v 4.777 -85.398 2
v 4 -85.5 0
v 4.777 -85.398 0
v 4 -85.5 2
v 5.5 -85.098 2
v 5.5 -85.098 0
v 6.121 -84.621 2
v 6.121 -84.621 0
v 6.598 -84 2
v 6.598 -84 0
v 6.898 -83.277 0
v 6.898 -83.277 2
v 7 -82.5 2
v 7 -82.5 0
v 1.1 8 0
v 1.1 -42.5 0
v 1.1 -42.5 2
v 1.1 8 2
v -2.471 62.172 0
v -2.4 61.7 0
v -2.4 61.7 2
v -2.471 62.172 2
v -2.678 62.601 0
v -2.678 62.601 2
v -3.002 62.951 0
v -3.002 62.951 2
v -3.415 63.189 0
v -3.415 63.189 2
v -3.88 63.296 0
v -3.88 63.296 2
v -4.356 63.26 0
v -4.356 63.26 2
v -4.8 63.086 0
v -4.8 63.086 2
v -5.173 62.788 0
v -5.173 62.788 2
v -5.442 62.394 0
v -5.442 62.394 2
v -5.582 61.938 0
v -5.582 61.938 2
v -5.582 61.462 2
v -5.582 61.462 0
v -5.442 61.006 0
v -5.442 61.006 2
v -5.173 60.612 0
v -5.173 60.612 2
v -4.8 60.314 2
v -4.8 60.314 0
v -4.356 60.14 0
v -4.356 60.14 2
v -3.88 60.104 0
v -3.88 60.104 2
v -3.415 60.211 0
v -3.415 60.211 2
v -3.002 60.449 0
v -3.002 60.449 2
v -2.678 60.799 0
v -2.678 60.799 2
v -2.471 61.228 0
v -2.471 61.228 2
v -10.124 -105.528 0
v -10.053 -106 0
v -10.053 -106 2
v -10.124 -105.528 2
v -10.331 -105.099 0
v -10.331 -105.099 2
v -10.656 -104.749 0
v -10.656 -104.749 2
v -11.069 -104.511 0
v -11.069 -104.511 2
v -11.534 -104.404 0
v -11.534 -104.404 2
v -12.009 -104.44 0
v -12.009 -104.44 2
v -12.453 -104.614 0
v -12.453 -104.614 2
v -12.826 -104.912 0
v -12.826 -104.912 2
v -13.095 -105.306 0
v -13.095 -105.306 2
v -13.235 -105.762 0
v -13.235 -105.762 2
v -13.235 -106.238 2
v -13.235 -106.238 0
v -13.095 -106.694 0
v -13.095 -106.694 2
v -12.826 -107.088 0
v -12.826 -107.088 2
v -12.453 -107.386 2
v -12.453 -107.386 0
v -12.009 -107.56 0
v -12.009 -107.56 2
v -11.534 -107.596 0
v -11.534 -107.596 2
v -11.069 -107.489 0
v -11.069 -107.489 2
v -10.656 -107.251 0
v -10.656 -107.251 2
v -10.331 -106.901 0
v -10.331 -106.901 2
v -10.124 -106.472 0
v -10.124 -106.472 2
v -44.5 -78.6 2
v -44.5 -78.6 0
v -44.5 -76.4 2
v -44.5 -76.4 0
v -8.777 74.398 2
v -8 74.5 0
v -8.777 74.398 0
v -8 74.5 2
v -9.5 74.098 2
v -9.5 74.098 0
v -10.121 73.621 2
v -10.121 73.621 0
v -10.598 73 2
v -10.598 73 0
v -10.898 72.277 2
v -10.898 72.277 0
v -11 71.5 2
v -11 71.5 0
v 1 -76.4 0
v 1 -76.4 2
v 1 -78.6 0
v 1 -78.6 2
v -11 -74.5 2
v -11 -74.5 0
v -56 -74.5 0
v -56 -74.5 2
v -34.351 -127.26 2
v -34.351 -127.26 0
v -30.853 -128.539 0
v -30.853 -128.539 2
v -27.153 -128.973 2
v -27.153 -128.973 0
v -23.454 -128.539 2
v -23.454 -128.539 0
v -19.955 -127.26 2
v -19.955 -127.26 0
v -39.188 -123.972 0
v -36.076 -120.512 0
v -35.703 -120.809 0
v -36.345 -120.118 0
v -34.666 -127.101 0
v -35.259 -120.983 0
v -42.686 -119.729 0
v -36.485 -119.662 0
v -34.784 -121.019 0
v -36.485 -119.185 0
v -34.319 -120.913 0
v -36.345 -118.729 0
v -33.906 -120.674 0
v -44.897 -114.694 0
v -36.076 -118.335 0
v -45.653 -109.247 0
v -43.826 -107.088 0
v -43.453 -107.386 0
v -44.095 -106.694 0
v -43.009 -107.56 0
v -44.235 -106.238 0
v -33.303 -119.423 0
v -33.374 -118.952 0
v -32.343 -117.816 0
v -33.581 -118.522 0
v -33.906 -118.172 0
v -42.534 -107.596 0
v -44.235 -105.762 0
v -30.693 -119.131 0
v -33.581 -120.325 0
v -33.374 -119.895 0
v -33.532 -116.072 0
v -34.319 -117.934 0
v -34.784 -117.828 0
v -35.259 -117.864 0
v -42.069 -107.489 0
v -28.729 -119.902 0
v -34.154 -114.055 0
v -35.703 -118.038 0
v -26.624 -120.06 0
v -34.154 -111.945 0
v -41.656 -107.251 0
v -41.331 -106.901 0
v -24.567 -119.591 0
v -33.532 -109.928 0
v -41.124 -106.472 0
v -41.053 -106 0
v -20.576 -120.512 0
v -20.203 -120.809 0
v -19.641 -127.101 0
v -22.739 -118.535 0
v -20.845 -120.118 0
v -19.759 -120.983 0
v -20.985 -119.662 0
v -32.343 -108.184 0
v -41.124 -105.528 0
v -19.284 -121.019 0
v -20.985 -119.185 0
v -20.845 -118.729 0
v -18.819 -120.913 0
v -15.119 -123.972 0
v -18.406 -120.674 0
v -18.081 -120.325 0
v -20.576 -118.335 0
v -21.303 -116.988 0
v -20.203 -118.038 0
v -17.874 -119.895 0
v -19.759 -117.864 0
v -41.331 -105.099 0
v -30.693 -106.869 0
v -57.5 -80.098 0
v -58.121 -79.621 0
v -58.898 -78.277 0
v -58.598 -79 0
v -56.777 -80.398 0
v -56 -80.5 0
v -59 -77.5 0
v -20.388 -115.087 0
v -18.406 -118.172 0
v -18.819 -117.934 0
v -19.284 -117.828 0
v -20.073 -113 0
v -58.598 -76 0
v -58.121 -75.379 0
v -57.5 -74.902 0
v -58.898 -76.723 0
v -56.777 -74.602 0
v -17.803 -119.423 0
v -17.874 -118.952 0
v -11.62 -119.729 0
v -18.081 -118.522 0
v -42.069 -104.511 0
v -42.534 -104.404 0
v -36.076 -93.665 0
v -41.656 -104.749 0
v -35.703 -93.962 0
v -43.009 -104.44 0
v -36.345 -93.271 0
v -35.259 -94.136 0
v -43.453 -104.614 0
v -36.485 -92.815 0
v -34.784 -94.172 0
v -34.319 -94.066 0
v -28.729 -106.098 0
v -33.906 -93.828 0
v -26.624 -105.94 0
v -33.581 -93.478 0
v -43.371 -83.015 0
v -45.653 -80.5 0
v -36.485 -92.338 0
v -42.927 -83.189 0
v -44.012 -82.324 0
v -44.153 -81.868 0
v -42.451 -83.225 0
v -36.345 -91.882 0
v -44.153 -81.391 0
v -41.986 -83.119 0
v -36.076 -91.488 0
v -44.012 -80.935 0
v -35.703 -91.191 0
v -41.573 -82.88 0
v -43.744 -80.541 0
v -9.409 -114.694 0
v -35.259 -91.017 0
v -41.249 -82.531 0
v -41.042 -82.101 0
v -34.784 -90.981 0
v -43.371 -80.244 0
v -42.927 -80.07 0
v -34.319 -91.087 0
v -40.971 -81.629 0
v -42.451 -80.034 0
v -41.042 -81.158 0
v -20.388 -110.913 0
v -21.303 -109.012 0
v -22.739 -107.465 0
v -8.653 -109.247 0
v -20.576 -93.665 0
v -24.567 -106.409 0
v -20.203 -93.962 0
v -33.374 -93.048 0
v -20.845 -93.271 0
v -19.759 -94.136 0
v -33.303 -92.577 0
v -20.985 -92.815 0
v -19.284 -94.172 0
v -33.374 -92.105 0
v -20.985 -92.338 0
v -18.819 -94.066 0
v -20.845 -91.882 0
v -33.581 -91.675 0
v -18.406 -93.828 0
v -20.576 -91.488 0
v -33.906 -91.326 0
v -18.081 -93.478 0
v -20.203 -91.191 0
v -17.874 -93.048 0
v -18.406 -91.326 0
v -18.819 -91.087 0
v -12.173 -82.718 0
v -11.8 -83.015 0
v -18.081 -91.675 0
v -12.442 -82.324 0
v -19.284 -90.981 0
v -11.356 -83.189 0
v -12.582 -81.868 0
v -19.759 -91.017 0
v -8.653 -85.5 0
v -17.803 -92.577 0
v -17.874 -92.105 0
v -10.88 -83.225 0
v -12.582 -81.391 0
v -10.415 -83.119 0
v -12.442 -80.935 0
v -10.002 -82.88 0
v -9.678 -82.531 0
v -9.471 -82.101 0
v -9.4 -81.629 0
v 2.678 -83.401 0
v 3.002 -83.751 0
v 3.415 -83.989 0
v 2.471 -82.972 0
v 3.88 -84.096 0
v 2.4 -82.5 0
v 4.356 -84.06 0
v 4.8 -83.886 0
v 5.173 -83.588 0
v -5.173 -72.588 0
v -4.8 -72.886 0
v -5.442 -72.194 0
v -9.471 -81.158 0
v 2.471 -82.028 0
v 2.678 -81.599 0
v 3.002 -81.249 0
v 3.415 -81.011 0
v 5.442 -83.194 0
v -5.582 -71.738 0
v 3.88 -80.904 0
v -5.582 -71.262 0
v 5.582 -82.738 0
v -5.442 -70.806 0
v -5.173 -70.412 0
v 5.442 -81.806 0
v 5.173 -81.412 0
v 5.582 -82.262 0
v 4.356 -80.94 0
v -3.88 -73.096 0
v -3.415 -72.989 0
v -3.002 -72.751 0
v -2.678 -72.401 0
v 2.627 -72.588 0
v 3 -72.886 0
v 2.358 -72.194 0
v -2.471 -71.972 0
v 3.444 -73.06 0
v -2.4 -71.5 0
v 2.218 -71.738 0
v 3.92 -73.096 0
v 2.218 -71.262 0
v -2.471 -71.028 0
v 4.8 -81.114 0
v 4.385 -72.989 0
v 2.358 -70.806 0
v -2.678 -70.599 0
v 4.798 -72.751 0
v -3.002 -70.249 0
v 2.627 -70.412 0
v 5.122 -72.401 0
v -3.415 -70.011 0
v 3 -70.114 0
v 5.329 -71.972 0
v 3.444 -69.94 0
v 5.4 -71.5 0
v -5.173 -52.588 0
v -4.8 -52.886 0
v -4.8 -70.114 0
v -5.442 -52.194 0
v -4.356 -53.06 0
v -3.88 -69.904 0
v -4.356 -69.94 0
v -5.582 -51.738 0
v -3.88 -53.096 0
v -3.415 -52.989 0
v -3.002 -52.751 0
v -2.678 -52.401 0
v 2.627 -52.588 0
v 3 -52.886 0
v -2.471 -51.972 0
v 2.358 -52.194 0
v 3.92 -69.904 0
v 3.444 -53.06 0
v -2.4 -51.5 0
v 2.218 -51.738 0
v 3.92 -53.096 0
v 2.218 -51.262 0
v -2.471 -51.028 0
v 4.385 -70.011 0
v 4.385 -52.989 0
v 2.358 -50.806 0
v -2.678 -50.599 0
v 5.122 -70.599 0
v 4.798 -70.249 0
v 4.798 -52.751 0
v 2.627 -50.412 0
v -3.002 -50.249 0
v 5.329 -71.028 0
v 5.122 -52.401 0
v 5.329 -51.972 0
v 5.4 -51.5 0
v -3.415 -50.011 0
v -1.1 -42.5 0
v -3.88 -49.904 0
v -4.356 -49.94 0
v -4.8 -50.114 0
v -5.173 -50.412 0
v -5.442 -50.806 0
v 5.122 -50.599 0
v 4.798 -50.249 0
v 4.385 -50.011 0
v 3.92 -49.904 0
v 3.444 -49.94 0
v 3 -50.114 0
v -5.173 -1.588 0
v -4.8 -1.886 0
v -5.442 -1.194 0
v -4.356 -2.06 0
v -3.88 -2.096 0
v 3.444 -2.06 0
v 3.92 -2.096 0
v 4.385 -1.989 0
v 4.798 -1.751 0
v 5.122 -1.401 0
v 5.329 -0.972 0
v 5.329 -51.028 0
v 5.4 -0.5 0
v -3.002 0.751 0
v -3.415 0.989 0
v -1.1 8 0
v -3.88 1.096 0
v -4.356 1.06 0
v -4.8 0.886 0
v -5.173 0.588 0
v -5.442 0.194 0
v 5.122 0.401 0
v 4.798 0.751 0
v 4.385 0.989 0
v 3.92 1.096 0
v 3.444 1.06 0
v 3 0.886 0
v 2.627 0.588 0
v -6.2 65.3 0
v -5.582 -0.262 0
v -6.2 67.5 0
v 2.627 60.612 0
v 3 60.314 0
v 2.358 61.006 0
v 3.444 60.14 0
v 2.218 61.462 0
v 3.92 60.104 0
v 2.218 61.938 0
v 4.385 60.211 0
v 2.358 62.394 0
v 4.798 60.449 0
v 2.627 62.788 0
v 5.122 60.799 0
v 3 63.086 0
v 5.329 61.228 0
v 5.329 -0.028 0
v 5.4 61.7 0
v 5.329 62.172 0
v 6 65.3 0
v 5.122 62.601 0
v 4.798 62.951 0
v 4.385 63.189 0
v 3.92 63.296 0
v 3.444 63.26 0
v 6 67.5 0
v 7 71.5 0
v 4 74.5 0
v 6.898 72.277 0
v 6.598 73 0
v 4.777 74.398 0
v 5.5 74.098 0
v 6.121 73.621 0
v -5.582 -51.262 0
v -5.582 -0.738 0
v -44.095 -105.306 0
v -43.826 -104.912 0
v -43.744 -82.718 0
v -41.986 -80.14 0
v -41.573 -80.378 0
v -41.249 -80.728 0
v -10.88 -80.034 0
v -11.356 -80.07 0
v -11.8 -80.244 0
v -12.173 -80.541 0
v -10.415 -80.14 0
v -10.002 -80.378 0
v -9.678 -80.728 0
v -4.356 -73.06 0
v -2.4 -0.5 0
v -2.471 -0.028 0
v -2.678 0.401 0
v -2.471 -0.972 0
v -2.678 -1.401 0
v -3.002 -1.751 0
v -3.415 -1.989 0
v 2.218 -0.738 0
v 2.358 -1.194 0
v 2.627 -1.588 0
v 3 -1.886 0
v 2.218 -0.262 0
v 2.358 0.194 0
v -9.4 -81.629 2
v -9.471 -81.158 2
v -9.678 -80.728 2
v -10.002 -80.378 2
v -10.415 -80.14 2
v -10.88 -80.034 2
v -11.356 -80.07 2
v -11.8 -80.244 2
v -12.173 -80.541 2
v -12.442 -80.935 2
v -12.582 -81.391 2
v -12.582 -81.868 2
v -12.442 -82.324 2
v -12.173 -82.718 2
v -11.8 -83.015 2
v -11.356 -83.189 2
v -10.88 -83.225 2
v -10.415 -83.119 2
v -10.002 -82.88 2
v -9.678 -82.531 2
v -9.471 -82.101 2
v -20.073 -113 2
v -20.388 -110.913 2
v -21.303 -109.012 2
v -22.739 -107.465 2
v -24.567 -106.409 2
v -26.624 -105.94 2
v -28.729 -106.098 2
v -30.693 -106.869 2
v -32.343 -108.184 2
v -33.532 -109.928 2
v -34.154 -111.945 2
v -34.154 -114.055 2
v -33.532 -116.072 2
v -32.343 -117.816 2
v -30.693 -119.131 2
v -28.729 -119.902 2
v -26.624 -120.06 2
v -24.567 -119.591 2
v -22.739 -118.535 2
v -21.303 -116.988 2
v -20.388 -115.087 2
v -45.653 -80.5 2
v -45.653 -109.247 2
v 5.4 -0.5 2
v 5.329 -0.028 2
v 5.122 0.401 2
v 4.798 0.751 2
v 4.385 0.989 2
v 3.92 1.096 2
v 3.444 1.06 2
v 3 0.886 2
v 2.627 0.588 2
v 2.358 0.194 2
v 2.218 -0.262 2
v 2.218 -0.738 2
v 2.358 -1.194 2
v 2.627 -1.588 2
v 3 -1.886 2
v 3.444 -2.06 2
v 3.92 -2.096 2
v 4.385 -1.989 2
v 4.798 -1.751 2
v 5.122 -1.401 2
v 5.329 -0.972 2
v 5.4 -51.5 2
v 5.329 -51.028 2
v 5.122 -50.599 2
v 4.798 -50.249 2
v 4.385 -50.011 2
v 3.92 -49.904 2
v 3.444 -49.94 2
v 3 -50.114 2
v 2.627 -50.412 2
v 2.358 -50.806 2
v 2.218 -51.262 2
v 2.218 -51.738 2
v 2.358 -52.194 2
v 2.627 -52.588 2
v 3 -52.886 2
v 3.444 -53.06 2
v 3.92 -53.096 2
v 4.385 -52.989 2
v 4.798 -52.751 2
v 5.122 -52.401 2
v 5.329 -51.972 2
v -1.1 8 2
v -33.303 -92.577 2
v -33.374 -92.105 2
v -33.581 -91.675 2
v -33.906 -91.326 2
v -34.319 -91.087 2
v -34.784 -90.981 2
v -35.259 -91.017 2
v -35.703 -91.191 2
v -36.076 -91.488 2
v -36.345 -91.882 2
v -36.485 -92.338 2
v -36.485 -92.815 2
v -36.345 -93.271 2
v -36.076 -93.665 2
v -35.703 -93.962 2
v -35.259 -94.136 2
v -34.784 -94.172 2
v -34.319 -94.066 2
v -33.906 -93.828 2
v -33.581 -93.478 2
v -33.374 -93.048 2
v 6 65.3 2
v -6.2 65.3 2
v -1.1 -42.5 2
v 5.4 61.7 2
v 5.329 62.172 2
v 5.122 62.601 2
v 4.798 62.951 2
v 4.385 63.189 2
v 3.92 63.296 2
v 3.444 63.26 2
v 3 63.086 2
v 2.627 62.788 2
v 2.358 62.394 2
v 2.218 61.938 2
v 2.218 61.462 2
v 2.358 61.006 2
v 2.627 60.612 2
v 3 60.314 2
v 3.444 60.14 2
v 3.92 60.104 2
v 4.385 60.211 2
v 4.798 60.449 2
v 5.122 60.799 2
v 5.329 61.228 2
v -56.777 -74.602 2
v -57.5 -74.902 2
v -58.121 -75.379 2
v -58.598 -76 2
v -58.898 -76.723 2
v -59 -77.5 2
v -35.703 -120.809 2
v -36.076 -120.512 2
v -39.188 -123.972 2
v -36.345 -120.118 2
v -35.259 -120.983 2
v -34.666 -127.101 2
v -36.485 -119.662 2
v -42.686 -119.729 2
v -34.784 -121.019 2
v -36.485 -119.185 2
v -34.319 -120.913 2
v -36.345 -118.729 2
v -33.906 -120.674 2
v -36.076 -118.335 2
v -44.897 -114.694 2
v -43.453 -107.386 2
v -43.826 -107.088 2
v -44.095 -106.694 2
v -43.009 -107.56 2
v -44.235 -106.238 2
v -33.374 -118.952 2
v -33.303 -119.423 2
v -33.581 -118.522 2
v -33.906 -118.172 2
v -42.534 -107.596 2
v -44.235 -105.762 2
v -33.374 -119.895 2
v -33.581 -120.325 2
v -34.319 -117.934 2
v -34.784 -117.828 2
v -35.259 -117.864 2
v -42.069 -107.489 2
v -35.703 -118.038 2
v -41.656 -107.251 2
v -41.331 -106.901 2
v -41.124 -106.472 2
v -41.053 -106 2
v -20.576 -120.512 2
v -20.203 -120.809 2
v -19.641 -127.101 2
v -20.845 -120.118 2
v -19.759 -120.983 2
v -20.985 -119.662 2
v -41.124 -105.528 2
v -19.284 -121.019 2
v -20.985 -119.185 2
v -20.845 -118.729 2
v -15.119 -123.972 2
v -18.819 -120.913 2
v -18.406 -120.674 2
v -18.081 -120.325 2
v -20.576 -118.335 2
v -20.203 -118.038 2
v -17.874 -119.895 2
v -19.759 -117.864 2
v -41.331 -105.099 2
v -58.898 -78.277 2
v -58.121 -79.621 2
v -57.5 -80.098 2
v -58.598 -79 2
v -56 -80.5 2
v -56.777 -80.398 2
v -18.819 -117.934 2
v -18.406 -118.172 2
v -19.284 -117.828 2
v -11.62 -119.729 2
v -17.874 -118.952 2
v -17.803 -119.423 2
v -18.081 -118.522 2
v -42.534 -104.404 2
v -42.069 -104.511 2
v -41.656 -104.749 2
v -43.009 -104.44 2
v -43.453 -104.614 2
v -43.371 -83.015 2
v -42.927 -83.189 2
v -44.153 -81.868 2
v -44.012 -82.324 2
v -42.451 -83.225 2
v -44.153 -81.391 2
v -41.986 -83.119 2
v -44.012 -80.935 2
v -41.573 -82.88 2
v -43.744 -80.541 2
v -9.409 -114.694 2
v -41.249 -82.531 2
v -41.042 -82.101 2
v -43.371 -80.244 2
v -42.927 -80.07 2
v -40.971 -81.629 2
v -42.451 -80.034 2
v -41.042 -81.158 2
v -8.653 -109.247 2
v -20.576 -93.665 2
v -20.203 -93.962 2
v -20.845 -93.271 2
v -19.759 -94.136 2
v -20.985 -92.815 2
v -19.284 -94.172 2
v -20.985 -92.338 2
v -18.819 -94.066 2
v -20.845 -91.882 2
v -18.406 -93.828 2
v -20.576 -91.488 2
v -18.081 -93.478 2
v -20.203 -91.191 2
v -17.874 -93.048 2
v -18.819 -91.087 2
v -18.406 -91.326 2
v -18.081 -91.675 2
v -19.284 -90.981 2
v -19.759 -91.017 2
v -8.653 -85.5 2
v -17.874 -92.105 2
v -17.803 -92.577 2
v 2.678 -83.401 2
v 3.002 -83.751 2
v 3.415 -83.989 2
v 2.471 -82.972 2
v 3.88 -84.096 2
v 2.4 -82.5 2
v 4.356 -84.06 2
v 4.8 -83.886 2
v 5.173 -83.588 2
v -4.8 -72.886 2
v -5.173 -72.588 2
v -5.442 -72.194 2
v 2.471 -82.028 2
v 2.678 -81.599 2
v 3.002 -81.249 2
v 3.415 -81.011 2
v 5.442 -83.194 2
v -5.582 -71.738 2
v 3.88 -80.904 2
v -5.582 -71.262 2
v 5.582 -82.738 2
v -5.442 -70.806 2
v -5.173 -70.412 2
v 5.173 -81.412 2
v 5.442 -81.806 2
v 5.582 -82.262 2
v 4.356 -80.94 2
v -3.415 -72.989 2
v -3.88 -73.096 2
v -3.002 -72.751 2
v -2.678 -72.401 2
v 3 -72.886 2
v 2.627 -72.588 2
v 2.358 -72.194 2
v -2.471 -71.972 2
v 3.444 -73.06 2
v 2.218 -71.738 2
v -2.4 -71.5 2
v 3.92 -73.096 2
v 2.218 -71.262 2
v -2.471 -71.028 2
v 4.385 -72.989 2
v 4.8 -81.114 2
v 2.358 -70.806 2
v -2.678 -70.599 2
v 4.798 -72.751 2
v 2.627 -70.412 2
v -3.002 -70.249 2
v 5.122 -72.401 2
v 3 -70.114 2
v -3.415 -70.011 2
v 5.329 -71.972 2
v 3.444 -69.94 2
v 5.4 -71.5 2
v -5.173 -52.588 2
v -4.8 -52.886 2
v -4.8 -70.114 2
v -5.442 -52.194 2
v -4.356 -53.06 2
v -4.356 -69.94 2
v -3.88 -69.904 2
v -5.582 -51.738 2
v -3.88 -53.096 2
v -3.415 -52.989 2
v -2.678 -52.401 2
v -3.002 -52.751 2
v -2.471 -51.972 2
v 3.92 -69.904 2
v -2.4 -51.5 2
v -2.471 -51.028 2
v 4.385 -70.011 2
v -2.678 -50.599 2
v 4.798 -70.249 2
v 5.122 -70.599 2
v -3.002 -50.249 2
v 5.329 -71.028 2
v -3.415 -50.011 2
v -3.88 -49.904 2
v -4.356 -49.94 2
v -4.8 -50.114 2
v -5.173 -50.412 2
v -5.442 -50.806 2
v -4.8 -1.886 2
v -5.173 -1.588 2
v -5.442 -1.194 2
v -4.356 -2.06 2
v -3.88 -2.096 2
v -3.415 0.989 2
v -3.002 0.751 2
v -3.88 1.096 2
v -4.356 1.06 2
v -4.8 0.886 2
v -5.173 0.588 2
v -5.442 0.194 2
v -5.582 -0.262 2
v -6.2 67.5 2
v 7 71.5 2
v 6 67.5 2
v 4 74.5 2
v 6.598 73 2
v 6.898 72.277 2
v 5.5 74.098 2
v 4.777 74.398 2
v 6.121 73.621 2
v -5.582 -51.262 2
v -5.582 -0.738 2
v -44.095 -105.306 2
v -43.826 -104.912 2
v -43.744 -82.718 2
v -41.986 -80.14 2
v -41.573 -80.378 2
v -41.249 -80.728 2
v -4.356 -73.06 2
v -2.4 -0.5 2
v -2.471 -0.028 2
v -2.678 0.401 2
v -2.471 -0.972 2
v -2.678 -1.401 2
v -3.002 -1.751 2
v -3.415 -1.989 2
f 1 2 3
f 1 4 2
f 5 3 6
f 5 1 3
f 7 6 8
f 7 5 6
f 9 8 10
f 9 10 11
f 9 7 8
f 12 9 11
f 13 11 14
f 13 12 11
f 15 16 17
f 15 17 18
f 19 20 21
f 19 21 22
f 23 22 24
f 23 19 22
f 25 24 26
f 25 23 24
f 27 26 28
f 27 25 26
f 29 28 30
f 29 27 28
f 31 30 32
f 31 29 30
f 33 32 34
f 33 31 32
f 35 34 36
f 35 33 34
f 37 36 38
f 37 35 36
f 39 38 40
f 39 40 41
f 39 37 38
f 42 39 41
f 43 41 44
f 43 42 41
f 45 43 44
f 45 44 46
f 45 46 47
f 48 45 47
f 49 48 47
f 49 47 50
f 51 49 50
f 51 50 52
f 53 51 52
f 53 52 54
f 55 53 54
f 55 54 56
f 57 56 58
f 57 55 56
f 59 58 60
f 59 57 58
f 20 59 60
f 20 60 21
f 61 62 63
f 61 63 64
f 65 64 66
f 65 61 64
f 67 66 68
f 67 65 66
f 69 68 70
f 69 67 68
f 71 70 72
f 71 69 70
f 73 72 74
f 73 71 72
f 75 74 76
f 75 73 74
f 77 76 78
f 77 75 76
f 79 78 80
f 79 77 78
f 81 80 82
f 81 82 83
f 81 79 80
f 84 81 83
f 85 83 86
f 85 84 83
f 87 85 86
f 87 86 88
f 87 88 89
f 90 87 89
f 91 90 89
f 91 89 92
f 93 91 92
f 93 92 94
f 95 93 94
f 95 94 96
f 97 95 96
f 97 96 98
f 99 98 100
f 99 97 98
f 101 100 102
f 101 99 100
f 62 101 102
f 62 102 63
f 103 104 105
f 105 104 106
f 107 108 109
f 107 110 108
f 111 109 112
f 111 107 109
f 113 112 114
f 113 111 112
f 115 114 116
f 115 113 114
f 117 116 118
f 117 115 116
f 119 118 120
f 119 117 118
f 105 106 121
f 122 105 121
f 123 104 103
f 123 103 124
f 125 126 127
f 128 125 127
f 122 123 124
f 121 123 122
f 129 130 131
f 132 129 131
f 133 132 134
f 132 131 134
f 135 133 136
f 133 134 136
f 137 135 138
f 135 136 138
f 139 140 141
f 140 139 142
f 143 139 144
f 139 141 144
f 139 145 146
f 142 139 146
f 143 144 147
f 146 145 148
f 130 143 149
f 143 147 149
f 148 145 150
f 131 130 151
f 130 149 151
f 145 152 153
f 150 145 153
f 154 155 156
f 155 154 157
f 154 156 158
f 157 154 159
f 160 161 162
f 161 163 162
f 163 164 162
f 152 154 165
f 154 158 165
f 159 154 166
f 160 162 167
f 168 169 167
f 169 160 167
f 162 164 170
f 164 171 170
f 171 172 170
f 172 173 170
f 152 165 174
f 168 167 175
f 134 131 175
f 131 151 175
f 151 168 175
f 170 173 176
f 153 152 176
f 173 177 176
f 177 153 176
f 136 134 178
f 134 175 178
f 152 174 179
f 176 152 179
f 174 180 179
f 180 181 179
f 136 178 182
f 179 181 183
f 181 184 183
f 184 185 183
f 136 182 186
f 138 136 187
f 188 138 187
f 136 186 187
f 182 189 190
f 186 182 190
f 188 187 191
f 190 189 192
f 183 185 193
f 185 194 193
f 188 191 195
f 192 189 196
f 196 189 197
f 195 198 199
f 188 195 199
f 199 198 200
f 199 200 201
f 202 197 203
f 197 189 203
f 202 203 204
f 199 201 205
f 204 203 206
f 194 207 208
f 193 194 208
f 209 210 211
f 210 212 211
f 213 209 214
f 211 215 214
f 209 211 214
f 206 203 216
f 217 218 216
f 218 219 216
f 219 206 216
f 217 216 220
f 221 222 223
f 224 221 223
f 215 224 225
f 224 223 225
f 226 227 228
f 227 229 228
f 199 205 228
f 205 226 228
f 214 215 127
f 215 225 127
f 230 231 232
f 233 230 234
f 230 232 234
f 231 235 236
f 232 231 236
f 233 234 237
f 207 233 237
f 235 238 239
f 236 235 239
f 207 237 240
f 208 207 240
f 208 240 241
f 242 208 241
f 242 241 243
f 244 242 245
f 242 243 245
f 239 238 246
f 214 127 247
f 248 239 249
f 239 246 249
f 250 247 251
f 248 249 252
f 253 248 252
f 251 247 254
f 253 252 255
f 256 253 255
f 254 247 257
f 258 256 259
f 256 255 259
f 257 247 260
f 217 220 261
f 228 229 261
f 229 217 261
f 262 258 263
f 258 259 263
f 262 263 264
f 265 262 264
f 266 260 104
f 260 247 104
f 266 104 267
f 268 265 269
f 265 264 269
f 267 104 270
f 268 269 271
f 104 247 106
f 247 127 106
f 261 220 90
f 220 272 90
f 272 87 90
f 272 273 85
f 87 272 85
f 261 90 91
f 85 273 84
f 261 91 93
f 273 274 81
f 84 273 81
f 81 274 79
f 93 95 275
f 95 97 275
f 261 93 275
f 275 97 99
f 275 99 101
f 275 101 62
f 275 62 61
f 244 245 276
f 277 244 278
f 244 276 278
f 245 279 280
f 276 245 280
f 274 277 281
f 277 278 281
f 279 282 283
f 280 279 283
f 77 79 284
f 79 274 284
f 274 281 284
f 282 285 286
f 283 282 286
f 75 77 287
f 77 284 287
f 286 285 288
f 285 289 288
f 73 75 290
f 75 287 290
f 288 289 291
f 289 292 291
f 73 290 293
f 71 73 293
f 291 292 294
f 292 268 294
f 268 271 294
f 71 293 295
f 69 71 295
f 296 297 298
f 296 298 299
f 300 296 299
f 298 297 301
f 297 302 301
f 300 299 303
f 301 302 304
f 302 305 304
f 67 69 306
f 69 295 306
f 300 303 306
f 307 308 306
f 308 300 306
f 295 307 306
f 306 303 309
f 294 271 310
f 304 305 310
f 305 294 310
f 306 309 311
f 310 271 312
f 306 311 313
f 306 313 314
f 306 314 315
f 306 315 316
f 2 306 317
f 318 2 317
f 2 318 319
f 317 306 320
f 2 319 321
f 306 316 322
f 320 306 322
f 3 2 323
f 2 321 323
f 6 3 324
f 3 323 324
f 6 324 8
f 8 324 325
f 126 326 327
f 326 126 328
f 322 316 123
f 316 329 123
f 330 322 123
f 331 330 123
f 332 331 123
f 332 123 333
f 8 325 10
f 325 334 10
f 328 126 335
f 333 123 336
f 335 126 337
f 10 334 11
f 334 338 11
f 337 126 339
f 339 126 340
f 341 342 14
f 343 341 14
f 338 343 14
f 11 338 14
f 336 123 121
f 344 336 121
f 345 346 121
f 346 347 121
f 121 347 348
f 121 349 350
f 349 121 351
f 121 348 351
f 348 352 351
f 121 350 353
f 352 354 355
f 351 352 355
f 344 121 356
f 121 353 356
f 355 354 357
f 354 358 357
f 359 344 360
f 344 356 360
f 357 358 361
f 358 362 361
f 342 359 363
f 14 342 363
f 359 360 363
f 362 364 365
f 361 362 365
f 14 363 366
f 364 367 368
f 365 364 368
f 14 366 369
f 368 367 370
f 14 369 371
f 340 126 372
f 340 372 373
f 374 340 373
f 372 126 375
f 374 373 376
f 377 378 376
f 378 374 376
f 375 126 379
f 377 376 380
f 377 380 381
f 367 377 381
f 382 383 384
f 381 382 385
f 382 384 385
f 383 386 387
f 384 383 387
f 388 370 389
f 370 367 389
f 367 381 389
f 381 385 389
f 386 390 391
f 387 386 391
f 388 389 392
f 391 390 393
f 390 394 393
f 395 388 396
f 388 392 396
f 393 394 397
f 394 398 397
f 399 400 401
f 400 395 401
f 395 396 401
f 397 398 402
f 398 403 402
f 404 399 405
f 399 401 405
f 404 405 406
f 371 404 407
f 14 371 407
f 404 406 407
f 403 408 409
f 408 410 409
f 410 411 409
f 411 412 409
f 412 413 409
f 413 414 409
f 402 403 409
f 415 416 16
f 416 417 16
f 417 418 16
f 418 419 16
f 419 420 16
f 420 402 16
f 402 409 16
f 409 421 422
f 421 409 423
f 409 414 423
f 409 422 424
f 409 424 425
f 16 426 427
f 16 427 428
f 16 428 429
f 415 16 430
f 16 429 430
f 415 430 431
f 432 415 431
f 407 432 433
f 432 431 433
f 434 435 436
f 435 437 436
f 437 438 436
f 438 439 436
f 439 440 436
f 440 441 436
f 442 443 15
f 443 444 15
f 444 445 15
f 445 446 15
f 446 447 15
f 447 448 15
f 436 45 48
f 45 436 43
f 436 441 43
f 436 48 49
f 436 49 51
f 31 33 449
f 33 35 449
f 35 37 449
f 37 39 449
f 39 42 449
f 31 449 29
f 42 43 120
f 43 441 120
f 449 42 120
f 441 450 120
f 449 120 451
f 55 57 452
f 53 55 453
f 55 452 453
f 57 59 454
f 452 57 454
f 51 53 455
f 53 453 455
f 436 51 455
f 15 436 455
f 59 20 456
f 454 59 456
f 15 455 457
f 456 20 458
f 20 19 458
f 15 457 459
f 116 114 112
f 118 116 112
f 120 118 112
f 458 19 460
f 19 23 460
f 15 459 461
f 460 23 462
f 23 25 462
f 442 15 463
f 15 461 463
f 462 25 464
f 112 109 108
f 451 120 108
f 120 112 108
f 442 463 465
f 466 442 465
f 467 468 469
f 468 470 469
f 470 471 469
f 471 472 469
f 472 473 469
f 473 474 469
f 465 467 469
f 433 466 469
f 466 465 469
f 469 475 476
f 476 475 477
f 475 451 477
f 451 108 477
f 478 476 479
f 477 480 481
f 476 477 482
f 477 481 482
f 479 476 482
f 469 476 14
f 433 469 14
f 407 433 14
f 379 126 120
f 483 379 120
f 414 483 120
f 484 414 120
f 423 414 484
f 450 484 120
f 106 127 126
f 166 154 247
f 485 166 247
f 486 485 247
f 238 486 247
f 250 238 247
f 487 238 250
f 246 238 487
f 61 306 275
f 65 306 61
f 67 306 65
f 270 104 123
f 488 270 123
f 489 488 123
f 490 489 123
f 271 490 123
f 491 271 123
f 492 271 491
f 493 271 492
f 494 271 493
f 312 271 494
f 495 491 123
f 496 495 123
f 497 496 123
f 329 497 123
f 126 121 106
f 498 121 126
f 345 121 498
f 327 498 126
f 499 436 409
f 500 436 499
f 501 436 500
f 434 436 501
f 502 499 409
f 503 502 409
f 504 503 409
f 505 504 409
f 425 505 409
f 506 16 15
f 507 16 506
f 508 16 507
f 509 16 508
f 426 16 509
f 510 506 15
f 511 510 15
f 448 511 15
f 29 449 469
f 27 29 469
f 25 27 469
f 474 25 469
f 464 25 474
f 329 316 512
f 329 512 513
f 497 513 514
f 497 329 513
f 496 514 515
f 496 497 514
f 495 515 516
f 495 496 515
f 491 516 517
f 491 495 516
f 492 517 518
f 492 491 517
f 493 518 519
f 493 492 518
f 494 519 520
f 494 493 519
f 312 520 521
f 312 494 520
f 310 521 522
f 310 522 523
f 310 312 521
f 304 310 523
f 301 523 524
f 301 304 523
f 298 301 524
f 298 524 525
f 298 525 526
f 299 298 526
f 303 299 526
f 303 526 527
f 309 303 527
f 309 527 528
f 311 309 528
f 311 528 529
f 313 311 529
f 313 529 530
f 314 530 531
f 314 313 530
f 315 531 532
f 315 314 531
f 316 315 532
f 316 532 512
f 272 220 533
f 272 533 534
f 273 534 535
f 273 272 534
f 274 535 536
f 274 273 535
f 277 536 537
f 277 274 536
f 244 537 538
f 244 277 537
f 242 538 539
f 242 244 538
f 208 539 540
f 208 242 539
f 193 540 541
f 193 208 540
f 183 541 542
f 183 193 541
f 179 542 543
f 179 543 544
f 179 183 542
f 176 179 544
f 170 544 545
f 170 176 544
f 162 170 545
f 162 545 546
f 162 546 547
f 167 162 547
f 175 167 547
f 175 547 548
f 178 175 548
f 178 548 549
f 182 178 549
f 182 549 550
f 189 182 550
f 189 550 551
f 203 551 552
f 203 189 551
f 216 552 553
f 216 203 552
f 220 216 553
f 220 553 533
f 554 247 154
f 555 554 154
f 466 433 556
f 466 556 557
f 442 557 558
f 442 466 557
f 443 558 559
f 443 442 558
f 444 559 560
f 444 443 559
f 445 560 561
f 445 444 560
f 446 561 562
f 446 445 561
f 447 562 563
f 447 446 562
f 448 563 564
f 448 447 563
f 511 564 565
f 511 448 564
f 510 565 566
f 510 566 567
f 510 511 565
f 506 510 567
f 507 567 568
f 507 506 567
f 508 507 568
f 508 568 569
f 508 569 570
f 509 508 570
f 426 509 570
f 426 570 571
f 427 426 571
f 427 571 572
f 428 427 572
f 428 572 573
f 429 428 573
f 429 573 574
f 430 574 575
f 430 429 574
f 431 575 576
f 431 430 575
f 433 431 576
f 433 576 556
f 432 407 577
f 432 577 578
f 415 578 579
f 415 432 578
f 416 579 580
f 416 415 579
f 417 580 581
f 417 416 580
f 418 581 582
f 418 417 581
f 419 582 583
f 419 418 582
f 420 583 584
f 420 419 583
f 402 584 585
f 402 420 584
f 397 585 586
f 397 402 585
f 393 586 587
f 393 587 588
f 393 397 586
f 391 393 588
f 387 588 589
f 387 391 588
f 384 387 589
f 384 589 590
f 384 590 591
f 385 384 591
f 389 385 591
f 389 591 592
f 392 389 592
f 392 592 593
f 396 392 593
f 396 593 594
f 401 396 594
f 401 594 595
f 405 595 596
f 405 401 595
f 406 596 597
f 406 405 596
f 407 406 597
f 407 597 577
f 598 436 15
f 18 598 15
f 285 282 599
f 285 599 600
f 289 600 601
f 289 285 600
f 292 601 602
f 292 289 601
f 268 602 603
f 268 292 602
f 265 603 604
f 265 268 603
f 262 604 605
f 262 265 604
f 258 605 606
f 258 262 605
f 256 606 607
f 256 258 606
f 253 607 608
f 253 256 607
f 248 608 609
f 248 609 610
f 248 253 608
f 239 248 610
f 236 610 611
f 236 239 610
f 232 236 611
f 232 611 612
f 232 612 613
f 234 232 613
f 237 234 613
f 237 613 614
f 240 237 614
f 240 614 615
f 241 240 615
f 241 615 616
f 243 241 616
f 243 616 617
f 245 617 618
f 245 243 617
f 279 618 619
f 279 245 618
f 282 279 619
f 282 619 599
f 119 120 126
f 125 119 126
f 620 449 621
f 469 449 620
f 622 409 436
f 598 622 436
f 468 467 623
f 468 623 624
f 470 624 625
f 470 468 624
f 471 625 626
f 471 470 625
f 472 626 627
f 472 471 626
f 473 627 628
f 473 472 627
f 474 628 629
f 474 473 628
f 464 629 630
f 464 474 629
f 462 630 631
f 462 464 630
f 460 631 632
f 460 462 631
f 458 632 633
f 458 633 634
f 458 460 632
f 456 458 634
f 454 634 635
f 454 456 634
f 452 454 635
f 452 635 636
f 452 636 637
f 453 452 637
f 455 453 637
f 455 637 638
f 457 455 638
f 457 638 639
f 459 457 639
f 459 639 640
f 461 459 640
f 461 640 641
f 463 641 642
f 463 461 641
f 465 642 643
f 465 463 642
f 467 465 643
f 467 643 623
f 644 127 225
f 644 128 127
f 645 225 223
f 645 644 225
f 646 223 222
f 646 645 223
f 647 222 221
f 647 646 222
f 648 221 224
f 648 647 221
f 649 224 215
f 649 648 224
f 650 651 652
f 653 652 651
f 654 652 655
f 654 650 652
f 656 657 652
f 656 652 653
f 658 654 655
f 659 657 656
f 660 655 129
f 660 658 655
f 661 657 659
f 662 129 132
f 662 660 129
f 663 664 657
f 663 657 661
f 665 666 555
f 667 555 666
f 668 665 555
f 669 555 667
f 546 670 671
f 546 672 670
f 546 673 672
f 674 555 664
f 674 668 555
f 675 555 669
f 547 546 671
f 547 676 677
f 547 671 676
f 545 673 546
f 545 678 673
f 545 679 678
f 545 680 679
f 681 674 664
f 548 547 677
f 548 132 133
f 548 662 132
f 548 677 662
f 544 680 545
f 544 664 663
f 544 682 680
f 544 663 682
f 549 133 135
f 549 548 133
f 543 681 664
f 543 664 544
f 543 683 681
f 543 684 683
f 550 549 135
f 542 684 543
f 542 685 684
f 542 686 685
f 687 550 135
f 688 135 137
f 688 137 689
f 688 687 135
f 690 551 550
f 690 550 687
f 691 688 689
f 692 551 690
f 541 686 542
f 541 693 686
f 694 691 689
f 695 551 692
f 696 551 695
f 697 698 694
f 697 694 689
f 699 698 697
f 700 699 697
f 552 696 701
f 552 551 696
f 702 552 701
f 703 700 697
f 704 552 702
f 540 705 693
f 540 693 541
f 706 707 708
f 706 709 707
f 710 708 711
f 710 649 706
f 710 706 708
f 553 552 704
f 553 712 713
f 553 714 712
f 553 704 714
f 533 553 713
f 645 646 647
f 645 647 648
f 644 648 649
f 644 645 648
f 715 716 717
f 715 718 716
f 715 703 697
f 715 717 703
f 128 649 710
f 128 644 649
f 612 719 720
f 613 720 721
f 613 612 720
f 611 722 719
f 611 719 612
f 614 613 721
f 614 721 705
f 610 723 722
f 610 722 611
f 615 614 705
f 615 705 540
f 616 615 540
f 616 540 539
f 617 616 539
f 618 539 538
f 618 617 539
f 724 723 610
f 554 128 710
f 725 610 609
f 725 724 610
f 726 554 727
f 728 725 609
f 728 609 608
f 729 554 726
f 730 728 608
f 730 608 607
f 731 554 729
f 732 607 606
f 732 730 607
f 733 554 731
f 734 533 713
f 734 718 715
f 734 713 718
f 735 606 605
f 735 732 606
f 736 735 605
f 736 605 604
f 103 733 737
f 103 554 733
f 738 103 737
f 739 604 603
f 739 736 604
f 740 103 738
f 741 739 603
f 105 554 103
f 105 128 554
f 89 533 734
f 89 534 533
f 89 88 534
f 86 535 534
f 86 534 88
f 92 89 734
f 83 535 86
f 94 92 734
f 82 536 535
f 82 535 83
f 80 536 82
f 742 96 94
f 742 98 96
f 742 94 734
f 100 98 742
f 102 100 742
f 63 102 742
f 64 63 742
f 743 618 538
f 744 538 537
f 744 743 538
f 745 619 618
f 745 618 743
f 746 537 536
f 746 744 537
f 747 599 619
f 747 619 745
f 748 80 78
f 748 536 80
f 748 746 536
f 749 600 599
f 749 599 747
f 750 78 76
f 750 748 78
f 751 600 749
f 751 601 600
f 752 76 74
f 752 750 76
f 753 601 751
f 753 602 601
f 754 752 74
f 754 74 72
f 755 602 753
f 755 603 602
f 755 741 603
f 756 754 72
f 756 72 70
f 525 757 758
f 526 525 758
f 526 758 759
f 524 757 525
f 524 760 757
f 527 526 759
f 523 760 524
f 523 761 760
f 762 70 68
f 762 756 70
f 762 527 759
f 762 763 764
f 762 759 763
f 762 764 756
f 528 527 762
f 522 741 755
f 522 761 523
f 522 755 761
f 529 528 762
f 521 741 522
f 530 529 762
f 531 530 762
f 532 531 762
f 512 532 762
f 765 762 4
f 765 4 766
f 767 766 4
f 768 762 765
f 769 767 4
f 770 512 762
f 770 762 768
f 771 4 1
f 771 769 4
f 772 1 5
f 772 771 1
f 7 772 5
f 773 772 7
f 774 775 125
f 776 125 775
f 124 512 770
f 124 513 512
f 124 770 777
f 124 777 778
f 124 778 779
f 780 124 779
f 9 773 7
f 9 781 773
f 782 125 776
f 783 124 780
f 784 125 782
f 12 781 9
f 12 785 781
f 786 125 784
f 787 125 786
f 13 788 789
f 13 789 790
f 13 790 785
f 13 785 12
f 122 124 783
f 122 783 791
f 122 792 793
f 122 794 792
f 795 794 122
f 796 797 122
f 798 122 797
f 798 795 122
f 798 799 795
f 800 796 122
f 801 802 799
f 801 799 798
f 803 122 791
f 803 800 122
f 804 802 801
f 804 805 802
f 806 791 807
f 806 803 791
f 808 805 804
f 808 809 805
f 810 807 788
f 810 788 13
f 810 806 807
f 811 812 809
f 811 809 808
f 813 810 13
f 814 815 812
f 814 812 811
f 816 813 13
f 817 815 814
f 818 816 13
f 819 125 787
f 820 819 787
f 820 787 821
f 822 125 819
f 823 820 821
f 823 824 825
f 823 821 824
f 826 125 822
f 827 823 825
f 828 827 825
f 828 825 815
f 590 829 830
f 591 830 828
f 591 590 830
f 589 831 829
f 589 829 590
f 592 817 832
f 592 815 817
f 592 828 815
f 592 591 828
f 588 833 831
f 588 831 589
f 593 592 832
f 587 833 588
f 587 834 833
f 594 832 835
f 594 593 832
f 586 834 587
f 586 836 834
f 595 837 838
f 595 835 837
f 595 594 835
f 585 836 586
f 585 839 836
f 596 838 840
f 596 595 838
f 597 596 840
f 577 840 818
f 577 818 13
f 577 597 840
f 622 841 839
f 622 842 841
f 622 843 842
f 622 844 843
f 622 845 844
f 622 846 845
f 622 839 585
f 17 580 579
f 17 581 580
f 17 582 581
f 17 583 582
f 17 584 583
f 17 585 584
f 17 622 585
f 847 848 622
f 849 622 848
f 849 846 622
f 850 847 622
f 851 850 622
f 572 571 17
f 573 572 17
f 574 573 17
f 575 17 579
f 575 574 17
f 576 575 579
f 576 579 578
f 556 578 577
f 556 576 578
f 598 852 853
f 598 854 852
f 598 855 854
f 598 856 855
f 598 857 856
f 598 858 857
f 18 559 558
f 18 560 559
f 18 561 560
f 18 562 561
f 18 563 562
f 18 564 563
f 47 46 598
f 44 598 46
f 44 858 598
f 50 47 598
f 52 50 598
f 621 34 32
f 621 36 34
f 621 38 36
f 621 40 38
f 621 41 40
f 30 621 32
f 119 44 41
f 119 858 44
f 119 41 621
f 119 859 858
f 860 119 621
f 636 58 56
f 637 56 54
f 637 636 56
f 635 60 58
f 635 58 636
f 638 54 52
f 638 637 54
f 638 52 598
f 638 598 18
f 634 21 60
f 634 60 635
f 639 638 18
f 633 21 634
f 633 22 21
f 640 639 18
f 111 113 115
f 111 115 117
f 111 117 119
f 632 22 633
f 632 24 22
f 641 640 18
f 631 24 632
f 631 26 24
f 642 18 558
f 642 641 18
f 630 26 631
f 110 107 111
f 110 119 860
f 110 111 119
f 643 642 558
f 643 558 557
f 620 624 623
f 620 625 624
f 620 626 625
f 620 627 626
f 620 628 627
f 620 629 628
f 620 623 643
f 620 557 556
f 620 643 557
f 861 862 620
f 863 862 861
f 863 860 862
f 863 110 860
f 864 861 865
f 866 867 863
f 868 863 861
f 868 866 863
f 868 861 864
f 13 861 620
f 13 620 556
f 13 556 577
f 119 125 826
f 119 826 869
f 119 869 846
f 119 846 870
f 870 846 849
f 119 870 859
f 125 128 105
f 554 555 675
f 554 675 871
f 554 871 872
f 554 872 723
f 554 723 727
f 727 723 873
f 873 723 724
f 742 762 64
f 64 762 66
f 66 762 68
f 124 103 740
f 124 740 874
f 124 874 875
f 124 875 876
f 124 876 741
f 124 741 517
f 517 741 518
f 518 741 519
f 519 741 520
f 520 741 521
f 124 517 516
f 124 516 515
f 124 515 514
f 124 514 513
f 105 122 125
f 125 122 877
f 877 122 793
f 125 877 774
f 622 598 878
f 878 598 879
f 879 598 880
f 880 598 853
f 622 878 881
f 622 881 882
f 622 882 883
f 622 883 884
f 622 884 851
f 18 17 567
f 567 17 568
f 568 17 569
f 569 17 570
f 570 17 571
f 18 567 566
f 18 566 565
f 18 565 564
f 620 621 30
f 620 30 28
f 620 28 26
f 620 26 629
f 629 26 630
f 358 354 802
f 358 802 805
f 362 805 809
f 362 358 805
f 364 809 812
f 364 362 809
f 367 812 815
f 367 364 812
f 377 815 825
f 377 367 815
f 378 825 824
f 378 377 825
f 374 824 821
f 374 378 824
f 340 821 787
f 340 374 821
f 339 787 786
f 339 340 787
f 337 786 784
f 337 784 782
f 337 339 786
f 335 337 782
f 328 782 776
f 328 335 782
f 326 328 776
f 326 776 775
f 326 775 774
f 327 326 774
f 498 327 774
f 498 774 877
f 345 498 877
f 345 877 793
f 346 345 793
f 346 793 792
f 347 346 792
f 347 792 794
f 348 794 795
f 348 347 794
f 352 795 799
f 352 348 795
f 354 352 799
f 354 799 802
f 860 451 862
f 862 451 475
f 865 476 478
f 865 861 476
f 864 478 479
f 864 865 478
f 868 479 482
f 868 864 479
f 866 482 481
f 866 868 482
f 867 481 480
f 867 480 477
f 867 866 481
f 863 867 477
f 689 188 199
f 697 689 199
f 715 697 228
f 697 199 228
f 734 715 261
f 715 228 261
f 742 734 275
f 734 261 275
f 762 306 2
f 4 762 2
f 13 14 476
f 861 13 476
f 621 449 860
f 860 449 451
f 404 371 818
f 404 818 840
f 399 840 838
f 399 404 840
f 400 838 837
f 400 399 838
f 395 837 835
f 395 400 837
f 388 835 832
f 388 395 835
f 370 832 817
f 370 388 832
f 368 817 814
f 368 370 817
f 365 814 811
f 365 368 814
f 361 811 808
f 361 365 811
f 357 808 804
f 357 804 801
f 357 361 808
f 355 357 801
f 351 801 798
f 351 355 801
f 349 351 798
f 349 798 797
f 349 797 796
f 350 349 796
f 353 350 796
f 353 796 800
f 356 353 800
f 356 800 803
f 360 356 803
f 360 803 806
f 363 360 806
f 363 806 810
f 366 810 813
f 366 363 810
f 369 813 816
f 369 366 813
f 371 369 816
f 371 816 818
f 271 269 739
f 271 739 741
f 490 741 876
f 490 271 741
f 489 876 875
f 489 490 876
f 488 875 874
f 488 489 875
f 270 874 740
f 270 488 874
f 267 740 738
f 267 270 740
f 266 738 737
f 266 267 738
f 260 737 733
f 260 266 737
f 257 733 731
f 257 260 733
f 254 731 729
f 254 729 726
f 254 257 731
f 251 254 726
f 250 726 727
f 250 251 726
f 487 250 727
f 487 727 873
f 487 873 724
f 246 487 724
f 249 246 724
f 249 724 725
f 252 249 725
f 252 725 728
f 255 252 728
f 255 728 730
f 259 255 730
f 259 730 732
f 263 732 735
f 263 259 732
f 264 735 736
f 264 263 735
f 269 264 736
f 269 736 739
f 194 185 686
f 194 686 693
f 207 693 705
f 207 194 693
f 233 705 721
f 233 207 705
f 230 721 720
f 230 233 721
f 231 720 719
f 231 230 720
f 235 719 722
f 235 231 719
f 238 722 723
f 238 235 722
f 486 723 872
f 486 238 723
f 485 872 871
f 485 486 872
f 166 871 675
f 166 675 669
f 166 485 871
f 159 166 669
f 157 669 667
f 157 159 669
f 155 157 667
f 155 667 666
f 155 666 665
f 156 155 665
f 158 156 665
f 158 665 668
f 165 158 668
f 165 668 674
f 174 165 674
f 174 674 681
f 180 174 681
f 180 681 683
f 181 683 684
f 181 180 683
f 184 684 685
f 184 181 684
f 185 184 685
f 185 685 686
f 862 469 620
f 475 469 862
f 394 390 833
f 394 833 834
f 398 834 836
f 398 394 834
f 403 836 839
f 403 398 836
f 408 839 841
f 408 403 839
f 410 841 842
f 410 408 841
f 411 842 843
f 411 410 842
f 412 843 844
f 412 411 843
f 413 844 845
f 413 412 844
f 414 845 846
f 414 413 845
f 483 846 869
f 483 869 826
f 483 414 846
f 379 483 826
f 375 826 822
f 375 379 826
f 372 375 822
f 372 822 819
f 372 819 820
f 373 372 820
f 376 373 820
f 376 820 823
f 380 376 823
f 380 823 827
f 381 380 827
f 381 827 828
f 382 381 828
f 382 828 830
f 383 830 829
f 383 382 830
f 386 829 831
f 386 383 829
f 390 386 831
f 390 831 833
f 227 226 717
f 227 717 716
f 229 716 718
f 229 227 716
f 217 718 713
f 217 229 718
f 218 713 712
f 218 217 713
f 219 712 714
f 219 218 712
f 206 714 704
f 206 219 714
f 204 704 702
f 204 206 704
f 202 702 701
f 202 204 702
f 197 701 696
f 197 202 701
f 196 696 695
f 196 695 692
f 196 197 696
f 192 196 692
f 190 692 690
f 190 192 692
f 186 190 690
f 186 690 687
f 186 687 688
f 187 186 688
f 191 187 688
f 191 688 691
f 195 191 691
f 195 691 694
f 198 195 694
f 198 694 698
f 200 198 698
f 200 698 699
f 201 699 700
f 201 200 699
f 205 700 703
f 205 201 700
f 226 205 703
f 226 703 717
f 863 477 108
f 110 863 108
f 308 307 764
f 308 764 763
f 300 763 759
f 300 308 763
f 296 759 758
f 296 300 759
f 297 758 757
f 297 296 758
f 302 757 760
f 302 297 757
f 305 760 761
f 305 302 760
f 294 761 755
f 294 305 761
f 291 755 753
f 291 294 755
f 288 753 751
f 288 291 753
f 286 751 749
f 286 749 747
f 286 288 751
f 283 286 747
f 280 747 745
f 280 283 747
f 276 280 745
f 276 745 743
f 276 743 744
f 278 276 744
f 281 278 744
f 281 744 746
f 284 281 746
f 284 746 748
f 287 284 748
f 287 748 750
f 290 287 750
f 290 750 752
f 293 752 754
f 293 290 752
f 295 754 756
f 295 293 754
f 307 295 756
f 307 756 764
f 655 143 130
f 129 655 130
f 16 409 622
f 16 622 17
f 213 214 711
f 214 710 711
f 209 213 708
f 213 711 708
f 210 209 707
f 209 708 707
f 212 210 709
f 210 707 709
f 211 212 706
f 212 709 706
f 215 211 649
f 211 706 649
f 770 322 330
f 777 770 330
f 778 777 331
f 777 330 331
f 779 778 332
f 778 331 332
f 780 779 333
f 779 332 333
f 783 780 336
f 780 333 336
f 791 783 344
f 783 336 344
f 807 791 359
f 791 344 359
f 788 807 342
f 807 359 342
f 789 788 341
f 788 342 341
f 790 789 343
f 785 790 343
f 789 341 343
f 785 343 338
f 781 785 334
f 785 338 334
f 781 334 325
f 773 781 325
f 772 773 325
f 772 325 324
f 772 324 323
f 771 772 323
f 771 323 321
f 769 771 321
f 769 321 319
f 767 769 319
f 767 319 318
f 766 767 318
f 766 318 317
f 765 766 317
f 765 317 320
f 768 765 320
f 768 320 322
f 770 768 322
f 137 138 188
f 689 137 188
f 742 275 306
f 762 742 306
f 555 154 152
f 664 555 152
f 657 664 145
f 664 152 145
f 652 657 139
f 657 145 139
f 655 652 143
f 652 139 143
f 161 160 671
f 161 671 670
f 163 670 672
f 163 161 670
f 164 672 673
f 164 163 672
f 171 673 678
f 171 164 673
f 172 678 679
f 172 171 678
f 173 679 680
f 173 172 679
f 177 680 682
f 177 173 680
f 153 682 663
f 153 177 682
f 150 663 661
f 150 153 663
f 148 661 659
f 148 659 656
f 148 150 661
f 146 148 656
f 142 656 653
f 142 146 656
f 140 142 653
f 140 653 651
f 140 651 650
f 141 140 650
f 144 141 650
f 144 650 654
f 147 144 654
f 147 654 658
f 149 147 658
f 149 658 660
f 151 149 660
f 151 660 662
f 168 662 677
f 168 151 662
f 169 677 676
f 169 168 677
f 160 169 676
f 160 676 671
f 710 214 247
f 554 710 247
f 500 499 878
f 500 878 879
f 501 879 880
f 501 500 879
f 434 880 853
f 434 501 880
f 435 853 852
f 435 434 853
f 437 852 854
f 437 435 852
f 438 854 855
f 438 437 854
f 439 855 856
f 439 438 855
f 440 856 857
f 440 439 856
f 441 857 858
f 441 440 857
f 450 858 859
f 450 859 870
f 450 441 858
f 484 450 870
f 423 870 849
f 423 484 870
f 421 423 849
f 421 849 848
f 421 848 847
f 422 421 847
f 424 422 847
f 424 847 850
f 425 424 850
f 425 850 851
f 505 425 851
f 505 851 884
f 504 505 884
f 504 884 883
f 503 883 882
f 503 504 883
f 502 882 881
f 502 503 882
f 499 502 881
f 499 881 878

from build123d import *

# Parameters (mm, degrees)
SKETCH_1_R          = 1.6
SKETCH_1_W          = 45.5
SKETCH_1_H          = 2.2
SKETCH_1_W_2        = 2.2
SKETCH_1_H_2        = 50.5
SKETCH_1_W_3        = 12.2
SKETCH_1_R_2        = 7.08
EXTRUDE_1_DEPTH     = 2
SKETCH_2_W          = 4
SKETCH_2_H          = 160
CUT_EXTRUDE_1_DEPTH = 10
SKETCH_3_R          = 1.6
CUT_EXTRUDE_2_DEPTH = 10
FILLET_1_R          = 3


with BuildPart() as part:
    # 草图1 → 凸台-拉伸1 (new body)
    with BuildSketch(Plane.XY):
        with BuildLine():
            Line((-8.65326359, -109.246690295), (-8.65326359, -85.5))
            Line((-8.65326359, -85.5), (11, -85.5))
            Line((11, -85.5), (11, 74.5))
            Line((11, 74.5), (-11, 74.5))
            Line((-11, 74.5), (-11, -74.5))
            Line((-11, -74.5), (-59, -74.5))
            Line((-59, -74.5), (-59, -80.5))
            Line((-59, -80.5), (-45.65326359, -80.5))
            Line((-45.65326359, -80.5), (-45.65326359, -109.246690295))
            ThreePointArc((-45.65326359, -109.246690295), (-42.686252119, -119.728927736), (-34.665533413, -127.101073304))
            Line((-34.665533413, -127.101073304), (-34.351105887, -127.259785353))
            ThreePointArc((-34.351105887, -127.259785353), (-27.15326359, -128.973428312), (-19.955421292, -127.259785353))
            Line((-19.955421292, -127.259785353), (-19.640993767, -127.101073304))
            ThreePointArc((-19.640993767, -127.101073304), (-11.620275061, -119.728927736), (-8.65326359, -109.246690295))
        make_face()
        with Locations((-11, -81.629391896)):
            Circle(SKETCH_1_R, mode=Mode.SUBTRACT)
        with Locations((-42.570682945, -81.629391896)):
            Circle(SKETCH_1_R, mode=Mode.SUBTRACT)
        with Locations((-42.65326359, -106)):
            Circle(SKETCH_1_R, mode=Mode.SUBTRACT)
        with Locations((-34.90326359, -92.576606241)):
            Circle(SKETCH_1_R, mode=Mode.SUBTRACT)
        with Locations((-19.40326359, -92.576606241)):
            Circle(SKETCH_1_R, mode=Mode.SUBTRACT)
        with Locations((-11.65326359, -106)):
            Circle(SKETCH_1_R, mode=Mode.SUBTRACT)
        with Locations((-19.40326359, -119.423393759)):
            Circle(SKETCH_1_R, mode=Mode.SUBTRACT)
        with Locations((-34.90326359, -119.423393759)):
            Circle(SKETCH_1_R, mode=Mode.SUBTRACT)
        with Locations((-21.75, -77.5)):
            Rectangle(SKETCH_1_W, SKETCH_1_H, mode=Mode.SUBTRACT)
        with Locations((3.8, 61.7)):
            Circle(SKETCH_1_R, mode=Mode.SUBTRACT)
        with Locations((-4, -71.5)):
            Circle(SKETCH_1_R, mode=Mode.SUBTRACT)
        with Locations((3.8, -71.5)):
            Circle(SKETCH_1_R, mode=Mode.SUBTRACT)
        with Locations((-4, -51.5)):
            Circle(SKETCH_1_R, mode=Mode.SUBTRACT)
        with Locations((3.8, -51.5)):
            Circle(SKETCH_1_R, mode=Mode.SUBTRACT)
        with Locations((0, -17.25)):
            Rectangle(SKETCH_1_W_2, SKETCH_1_H_2, mode=Mode.SUBTRACT)
        with Locations((-4, -0.5)):
            Circle(SKETCH_1_R, mode=Mode.SUBTRACT)
        with Locations((3.8, -0.5)):
            Circle(SKETCH_1_R, mode=Mode.SUBTRACT)
        with Locations((-4, 61.7)):
            Circle(SKETCH_1_R, mode=Mode.SUBTRACT)
        with Locations((-0.1, 66.4)):
            Rectangle(SKETCH_1_W_3, SKETCH_1_H, mode=Mode.SUBTRACT)
        with Locations((-27.15326359, -113)):
            Circle(SKETCH_1_R_2, mode=Mode.SUBTRACT)
    extrude(amount=EXTRUDE_1_DEPTH)

    # 草图2 → 切除-拉伸1 (cut)
    with BuildSketch(Plane(origin=(0, 0, 0), x_dir=(-1, 0, 0), z_dir=(0, 0, -1))):
        with Locations((-9, -5.5)):
            Rectangle(SKETCH_2_W, SKETCH_2_H)
    extrude(amount=-CUT_EXTRUDE_1_DEPTH, mode=Mode.SUBTRACT)

    # 草图3 → 切除-拉伸2 (cut)
    with BuildSketch(Plane(origin=(0, 0, 0), x_dir=(-1, 0, 0), z_dir=(0, 0, -1))):
        with Locations((-4, -82.5)):
            Circle(SKETCH_3_R)
    extrude(amount=-CUT_EXTRUDE_2_DEPTH, mode=Mode.SUBTRACT)

    # 圆角1
    fillet_1_edges = [part.edges().sort_by_distance(p)[0] for p in [
        (7, 74.5, 1),
        (-11, 74.5, 1),
        (-59, -74.5, 1),
        (-59, -80.5, 1),
        (7, -85.5, 1),
    ]]
    fillet(fillet_1_edges, radius=FILLET_1_R - 0.0001)  # a hair under: the kernel refuses the full size


solid = part.part
